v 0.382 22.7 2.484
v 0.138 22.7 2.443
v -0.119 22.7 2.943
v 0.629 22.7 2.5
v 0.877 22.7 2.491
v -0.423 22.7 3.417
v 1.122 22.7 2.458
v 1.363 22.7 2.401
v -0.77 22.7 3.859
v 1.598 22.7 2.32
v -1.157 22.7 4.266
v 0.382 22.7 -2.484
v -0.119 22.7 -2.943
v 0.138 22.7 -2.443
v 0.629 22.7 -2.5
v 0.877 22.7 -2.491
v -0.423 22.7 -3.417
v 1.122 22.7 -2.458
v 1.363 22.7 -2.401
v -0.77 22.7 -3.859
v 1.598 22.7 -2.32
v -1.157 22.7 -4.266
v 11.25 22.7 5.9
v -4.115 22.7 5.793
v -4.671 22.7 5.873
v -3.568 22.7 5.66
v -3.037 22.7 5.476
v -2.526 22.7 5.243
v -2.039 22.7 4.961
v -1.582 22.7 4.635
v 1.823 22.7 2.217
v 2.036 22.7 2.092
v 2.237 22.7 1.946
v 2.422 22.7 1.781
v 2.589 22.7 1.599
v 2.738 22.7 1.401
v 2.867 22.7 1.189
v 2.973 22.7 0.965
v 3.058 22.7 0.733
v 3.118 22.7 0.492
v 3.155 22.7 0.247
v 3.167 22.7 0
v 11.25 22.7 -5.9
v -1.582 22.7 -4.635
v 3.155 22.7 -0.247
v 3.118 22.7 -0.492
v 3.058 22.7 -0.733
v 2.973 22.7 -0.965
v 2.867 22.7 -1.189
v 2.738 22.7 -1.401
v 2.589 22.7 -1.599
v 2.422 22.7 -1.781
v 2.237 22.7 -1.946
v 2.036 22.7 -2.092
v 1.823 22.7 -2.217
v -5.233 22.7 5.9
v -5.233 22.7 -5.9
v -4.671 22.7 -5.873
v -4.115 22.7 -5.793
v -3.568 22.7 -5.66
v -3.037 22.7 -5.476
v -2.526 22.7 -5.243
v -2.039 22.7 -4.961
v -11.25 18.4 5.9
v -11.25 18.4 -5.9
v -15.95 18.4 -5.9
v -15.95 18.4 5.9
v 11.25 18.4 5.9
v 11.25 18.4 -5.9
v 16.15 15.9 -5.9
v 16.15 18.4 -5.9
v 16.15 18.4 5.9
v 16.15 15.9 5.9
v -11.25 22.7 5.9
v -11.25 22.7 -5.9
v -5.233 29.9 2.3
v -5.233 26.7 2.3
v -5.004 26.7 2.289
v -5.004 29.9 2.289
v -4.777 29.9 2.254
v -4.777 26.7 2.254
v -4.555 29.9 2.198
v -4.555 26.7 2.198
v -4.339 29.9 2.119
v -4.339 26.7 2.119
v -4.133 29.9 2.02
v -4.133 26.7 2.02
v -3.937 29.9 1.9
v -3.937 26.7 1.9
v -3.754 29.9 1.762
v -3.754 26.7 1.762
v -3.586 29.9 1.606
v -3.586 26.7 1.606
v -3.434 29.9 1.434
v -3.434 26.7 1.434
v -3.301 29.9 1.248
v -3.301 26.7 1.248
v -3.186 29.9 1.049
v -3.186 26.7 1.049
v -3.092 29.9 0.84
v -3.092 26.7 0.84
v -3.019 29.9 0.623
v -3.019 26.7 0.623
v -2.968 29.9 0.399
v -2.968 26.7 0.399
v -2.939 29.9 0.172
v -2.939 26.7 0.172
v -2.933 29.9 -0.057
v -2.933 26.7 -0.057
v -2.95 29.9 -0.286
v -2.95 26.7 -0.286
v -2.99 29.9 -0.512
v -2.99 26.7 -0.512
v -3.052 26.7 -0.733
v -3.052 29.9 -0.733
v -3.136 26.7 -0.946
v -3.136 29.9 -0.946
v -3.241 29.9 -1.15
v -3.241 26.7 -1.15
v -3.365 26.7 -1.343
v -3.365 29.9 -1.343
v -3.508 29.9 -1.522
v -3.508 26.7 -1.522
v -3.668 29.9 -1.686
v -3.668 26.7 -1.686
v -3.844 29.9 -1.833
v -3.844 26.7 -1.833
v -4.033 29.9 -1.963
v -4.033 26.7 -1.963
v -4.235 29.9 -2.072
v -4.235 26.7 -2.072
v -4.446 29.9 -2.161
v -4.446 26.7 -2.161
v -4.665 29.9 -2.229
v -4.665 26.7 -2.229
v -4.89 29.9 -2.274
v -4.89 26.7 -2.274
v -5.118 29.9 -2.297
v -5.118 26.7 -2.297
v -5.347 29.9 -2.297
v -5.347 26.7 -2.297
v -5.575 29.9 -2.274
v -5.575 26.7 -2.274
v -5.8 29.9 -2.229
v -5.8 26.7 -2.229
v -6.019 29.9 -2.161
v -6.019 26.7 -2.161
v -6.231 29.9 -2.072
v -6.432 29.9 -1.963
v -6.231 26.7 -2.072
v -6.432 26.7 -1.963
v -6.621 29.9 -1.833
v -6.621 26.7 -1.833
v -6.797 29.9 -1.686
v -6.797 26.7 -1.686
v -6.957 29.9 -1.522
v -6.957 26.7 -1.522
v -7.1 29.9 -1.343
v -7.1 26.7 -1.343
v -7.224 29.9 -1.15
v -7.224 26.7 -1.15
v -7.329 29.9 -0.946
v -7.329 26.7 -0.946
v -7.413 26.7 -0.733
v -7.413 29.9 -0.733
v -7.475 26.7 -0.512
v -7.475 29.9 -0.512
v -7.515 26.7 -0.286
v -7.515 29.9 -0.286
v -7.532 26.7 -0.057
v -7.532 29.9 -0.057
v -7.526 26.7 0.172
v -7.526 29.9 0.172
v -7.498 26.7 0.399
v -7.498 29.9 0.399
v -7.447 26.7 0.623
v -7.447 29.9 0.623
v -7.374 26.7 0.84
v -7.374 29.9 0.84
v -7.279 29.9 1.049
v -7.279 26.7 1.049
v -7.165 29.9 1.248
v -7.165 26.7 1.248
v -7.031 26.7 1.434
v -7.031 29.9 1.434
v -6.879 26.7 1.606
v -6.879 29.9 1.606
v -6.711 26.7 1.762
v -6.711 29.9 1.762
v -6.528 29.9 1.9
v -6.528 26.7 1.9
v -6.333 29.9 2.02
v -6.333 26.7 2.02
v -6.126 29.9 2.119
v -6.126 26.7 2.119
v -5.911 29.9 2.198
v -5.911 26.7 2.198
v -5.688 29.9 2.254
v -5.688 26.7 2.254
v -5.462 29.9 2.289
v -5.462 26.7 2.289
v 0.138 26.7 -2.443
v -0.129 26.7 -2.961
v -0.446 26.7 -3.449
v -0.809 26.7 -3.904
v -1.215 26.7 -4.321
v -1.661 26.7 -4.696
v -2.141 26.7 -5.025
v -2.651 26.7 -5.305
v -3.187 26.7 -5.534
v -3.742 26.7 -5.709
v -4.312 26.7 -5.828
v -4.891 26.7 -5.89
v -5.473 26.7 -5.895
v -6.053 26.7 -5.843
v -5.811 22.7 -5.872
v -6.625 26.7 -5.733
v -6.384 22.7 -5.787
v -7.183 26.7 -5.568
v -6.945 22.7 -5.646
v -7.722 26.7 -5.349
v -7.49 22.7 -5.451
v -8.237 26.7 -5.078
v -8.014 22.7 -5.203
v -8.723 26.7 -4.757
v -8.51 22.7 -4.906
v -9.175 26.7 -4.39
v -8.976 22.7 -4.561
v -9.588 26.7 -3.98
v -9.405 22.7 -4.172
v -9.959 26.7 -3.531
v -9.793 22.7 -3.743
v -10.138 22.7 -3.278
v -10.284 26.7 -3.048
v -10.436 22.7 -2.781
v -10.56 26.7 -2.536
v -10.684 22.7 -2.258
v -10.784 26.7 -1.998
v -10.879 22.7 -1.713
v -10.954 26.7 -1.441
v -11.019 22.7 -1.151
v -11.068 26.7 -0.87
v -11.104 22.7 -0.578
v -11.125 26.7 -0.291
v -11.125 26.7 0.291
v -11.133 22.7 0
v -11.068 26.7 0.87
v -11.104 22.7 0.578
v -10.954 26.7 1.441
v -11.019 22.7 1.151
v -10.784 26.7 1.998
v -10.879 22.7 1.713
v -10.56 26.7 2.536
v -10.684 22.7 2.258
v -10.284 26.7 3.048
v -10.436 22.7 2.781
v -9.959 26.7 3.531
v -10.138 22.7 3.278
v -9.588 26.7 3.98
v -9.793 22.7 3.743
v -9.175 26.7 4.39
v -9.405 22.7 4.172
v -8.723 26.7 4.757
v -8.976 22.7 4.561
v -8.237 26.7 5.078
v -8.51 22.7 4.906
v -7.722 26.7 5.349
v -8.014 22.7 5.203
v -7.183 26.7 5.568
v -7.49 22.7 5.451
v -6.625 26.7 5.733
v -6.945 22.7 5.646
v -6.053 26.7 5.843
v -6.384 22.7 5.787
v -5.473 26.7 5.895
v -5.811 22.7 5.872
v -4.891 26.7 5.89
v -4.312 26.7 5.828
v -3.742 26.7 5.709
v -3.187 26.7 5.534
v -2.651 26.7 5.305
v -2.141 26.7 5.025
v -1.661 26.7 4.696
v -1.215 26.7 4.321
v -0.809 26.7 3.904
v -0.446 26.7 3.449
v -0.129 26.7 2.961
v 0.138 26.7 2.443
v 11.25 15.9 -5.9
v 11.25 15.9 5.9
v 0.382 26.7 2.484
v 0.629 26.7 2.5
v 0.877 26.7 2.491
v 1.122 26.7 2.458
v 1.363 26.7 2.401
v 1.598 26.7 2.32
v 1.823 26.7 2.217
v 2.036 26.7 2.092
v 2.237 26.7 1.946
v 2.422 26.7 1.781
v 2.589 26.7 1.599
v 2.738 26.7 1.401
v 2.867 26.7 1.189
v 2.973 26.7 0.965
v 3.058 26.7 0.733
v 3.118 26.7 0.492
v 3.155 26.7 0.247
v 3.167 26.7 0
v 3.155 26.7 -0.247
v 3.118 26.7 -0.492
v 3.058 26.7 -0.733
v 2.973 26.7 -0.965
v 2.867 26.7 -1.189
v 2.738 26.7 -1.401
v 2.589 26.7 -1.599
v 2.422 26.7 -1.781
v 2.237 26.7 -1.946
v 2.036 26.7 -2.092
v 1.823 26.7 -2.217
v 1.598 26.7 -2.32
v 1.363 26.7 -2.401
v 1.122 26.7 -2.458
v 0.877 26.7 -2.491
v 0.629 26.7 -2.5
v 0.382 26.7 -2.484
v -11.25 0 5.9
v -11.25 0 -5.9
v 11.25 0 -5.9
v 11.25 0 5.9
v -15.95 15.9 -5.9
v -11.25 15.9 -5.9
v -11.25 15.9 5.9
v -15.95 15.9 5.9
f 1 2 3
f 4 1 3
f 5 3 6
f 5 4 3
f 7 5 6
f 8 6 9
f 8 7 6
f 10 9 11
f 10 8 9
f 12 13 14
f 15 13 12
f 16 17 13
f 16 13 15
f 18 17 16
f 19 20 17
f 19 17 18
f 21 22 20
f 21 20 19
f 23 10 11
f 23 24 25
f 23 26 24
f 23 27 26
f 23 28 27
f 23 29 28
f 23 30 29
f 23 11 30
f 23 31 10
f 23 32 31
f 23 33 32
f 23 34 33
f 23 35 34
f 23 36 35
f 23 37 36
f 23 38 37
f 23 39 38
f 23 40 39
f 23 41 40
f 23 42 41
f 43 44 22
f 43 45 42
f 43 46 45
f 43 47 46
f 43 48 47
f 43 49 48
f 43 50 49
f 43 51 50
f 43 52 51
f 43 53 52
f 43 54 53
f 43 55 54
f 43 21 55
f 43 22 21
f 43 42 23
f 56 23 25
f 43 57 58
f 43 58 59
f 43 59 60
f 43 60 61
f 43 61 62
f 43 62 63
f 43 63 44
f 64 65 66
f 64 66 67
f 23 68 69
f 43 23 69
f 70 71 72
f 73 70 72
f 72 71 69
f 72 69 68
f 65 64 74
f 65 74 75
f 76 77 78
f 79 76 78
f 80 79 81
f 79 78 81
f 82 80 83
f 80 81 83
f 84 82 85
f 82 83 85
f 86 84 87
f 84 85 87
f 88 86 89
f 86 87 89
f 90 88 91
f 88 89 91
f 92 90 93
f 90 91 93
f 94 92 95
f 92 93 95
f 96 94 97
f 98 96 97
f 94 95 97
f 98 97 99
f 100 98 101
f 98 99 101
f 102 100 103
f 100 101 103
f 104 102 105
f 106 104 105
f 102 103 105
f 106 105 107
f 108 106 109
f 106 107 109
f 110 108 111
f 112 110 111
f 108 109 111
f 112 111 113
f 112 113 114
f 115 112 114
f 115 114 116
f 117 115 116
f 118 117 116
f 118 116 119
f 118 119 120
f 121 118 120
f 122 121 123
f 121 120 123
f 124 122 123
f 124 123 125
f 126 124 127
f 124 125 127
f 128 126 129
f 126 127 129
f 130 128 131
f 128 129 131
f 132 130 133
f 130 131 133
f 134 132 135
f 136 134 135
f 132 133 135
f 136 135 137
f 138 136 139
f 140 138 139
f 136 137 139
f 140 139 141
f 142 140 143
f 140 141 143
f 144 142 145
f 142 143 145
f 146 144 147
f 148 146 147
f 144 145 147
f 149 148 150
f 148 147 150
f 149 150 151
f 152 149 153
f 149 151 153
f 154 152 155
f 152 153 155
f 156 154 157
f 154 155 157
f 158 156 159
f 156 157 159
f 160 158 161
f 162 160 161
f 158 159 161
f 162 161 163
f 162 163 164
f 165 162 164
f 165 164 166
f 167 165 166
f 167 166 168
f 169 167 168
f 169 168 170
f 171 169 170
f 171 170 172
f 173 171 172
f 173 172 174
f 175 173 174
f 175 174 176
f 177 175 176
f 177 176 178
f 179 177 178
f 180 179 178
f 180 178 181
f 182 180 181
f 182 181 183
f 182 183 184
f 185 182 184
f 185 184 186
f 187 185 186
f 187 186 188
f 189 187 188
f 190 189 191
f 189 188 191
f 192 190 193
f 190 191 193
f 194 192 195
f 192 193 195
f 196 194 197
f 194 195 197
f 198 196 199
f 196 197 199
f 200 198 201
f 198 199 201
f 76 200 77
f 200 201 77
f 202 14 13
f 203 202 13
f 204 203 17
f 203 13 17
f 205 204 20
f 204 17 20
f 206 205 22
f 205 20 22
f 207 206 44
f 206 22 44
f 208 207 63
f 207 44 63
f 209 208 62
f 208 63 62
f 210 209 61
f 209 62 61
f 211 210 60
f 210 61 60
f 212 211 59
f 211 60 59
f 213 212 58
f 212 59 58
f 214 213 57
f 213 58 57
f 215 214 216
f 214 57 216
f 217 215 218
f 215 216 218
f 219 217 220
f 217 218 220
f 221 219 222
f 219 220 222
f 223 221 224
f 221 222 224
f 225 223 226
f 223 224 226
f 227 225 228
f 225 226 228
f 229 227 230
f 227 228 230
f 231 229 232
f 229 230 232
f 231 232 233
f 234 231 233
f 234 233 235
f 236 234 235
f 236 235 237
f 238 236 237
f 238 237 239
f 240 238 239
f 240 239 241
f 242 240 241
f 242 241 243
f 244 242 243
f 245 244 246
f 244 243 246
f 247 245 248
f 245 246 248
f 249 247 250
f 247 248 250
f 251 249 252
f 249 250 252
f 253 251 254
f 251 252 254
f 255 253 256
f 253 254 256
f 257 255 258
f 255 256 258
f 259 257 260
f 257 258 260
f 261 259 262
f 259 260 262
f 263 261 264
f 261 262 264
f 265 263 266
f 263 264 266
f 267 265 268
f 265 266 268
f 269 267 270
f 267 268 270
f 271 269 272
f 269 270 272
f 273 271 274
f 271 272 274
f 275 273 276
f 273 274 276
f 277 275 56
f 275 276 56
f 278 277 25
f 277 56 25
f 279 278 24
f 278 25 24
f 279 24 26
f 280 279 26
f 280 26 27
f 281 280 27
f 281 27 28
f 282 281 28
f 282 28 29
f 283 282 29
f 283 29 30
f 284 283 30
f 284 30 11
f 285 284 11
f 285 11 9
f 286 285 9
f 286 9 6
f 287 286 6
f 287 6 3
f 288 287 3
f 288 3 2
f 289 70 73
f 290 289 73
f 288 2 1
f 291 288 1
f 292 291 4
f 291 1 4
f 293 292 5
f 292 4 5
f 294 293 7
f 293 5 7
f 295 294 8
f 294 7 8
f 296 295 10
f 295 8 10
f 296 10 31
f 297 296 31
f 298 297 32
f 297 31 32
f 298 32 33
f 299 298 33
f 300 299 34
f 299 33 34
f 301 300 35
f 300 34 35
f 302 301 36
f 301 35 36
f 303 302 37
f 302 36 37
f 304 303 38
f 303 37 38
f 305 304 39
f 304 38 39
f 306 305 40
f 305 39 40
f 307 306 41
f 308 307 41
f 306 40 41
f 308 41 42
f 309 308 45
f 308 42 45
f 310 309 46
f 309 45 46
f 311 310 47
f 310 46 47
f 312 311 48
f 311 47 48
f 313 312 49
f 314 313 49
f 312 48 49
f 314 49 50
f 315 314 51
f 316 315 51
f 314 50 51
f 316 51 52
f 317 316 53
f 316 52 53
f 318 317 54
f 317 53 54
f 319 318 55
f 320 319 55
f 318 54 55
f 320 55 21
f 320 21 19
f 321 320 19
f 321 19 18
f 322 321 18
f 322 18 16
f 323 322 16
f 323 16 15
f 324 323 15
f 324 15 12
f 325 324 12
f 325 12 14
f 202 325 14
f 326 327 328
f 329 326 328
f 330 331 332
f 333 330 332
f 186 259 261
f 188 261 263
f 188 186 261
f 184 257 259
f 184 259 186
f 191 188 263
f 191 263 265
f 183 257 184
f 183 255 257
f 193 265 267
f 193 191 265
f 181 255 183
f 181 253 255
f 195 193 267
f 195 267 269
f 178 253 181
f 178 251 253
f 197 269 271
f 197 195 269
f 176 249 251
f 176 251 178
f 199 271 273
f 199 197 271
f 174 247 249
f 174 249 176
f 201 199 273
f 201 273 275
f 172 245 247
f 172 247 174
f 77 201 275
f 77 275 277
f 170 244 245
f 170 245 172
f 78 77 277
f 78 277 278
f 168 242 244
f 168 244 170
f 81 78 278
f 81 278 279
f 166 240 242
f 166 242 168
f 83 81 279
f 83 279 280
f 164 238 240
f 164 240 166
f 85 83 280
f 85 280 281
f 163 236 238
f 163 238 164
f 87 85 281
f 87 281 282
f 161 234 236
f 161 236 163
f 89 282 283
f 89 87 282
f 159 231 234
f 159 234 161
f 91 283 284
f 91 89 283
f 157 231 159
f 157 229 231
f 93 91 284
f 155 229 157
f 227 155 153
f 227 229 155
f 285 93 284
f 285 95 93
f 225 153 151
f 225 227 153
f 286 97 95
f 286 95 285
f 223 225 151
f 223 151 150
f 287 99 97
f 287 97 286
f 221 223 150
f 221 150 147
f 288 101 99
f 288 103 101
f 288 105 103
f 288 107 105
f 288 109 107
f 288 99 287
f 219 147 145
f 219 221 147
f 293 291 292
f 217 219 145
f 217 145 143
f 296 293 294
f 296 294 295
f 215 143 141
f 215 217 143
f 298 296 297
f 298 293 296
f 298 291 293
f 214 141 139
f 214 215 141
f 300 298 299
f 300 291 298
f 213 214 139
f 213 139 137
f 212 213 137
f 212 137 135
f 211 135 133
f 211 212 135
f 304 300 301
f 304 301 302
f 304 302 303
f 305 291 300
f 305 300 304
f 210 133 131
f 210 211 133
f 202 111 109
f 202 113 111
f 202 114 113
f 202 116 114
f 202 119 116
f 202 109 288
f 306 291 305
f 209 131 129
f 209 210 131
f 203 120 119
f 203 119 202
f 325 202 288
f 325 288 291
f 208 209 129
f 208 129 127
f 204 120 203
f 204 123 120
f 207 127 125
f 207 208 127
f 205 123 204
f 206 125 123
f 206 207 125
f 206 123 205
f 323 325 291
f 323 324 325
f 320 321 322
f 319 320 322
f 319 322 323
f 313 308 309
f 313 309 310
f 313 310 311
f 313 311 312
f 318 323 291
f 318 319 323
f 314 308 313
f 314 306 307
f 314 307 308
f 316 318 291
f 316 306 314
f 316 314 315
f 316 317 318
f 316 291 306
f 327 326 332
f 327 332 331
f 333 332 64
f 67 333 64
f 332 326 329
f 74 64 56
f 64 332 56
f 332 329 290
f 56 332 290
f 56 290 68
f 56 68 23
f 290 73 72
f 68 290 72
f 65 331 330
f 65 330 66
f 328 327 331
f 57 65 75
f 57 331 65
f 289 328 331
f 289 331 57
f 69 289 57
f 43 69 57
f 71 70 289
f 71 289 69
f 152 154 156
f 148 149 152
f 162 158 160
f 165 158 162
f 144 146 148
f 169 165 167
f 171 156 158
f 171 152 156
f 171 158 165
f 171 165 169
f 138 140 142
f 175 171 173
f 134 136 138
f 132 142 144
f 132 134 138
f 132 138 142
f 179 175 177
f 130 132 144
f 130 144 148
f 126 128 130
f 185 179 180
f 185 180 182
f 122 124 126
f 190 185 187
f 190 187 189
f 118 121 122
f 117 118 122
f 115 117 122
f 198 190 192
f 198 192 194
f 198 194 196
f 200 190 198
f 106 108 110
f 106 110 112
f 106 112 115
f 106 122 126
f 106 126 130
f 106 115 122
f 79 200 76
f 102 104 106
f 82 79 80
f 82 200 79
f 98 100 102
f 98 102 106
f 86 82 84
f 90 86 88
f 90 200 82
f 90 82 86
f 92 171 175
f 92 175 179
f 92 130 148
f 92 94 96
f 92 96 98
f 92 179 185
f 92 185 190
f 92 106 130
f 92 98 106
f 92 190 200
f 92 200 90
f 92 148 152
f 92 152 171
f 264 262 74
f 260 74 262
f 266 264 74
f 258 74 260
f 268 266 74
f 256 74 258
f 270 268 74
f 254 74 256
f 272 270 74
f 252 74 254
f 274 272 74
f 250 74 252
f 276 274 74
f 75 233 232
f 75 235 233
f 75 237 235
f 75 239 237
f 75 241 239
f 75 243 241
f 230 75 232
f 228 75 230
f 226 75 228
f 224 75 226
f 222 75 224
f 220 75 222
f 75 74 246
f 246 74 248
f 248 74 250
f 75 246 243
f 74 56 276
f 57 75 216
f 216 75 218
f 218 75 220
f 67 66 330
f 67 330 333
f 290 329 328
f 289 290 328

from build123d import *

# Parameters (mm, degrees)
SKETCH1_W                = 22.5
SKETCH1_H                = 11.8
BOSS_EXTRUDE1_DEPTH      = 22.7
BOSS_EXTRUDE2_DEPTH      = 4.7
BOSS_EXTRUDE2_DEPTH_BACK = 27.4
SKETCH2_W                = 11.8
SKETCH2_H                = 2.5
BOSS_EXTRUDE3_DEPTH      = 4
SKETCH4_R                = 2.3
BOSS_EXTRUDE4_DEPTH      = 3.2


with BuildPart() as part:
    # Sketch1 → Boss-Extrude1 (new body)
    with BuildSketch(Plane(origin=(0, 0, 0), x_dir=(1, 0, 0), z_dir=(0, 1, 0))):
        Rectangle(SKETCH1_W, SKETCH1_H)
    extrude(amount=BOSS_EXTRUDE1_DEPTH)

    # Sketch2 → Boss-Extrude2 (add, two sides: drawn at the far end of the back side and taken through both)
    with BuildSketch(Plane.ZY.offset(11.25).offset(-BOSS_EXTRUDE2_DEPTH_BACK)):
        with Locations((0, 17.15)):
            Rectangle(SKETCH2_W, SKETCH2_H)
    extrude(amount=BOSS_EXTRUDE2_DEPTH + BOSS_EXTRUDE2_DEPTH_BACK)

    # Sketch3 → Boss-Extrude3 (add)
    with BuildSketch(Plane(origin=(0, 22.7, 0), x_dir=(1, 0, 0), z_dir=(0, 1, 0))):
        with BuildLine():
            ThreePointArc((0.137725696, 2.443247676), (-11.132613287, 0), (0.137725696, -2.443247676))
            ThreePointArc((0.137725696, -2.443247676), (3.167386713, 0), (0.137725696, 2.443247676))
        make_face()
    extrude(amount=BOSS_EXTRUDE3_DEPTH)

    # Sketch4 → Boss-Extrude4 (add)
    with BuildSketch(Plane(origin=(0, 26.7, 0), x_dir=(1, 0, 0), z_dir=(0, 1, 0))):
        with Locations(Location((-5.232613287, 0, 0), (0, 0, 270))):
            Circle(SKETCH4_R)
    extrude(amount=BOSS_EXTRUDE4_DEPTH)


solid = part.part
